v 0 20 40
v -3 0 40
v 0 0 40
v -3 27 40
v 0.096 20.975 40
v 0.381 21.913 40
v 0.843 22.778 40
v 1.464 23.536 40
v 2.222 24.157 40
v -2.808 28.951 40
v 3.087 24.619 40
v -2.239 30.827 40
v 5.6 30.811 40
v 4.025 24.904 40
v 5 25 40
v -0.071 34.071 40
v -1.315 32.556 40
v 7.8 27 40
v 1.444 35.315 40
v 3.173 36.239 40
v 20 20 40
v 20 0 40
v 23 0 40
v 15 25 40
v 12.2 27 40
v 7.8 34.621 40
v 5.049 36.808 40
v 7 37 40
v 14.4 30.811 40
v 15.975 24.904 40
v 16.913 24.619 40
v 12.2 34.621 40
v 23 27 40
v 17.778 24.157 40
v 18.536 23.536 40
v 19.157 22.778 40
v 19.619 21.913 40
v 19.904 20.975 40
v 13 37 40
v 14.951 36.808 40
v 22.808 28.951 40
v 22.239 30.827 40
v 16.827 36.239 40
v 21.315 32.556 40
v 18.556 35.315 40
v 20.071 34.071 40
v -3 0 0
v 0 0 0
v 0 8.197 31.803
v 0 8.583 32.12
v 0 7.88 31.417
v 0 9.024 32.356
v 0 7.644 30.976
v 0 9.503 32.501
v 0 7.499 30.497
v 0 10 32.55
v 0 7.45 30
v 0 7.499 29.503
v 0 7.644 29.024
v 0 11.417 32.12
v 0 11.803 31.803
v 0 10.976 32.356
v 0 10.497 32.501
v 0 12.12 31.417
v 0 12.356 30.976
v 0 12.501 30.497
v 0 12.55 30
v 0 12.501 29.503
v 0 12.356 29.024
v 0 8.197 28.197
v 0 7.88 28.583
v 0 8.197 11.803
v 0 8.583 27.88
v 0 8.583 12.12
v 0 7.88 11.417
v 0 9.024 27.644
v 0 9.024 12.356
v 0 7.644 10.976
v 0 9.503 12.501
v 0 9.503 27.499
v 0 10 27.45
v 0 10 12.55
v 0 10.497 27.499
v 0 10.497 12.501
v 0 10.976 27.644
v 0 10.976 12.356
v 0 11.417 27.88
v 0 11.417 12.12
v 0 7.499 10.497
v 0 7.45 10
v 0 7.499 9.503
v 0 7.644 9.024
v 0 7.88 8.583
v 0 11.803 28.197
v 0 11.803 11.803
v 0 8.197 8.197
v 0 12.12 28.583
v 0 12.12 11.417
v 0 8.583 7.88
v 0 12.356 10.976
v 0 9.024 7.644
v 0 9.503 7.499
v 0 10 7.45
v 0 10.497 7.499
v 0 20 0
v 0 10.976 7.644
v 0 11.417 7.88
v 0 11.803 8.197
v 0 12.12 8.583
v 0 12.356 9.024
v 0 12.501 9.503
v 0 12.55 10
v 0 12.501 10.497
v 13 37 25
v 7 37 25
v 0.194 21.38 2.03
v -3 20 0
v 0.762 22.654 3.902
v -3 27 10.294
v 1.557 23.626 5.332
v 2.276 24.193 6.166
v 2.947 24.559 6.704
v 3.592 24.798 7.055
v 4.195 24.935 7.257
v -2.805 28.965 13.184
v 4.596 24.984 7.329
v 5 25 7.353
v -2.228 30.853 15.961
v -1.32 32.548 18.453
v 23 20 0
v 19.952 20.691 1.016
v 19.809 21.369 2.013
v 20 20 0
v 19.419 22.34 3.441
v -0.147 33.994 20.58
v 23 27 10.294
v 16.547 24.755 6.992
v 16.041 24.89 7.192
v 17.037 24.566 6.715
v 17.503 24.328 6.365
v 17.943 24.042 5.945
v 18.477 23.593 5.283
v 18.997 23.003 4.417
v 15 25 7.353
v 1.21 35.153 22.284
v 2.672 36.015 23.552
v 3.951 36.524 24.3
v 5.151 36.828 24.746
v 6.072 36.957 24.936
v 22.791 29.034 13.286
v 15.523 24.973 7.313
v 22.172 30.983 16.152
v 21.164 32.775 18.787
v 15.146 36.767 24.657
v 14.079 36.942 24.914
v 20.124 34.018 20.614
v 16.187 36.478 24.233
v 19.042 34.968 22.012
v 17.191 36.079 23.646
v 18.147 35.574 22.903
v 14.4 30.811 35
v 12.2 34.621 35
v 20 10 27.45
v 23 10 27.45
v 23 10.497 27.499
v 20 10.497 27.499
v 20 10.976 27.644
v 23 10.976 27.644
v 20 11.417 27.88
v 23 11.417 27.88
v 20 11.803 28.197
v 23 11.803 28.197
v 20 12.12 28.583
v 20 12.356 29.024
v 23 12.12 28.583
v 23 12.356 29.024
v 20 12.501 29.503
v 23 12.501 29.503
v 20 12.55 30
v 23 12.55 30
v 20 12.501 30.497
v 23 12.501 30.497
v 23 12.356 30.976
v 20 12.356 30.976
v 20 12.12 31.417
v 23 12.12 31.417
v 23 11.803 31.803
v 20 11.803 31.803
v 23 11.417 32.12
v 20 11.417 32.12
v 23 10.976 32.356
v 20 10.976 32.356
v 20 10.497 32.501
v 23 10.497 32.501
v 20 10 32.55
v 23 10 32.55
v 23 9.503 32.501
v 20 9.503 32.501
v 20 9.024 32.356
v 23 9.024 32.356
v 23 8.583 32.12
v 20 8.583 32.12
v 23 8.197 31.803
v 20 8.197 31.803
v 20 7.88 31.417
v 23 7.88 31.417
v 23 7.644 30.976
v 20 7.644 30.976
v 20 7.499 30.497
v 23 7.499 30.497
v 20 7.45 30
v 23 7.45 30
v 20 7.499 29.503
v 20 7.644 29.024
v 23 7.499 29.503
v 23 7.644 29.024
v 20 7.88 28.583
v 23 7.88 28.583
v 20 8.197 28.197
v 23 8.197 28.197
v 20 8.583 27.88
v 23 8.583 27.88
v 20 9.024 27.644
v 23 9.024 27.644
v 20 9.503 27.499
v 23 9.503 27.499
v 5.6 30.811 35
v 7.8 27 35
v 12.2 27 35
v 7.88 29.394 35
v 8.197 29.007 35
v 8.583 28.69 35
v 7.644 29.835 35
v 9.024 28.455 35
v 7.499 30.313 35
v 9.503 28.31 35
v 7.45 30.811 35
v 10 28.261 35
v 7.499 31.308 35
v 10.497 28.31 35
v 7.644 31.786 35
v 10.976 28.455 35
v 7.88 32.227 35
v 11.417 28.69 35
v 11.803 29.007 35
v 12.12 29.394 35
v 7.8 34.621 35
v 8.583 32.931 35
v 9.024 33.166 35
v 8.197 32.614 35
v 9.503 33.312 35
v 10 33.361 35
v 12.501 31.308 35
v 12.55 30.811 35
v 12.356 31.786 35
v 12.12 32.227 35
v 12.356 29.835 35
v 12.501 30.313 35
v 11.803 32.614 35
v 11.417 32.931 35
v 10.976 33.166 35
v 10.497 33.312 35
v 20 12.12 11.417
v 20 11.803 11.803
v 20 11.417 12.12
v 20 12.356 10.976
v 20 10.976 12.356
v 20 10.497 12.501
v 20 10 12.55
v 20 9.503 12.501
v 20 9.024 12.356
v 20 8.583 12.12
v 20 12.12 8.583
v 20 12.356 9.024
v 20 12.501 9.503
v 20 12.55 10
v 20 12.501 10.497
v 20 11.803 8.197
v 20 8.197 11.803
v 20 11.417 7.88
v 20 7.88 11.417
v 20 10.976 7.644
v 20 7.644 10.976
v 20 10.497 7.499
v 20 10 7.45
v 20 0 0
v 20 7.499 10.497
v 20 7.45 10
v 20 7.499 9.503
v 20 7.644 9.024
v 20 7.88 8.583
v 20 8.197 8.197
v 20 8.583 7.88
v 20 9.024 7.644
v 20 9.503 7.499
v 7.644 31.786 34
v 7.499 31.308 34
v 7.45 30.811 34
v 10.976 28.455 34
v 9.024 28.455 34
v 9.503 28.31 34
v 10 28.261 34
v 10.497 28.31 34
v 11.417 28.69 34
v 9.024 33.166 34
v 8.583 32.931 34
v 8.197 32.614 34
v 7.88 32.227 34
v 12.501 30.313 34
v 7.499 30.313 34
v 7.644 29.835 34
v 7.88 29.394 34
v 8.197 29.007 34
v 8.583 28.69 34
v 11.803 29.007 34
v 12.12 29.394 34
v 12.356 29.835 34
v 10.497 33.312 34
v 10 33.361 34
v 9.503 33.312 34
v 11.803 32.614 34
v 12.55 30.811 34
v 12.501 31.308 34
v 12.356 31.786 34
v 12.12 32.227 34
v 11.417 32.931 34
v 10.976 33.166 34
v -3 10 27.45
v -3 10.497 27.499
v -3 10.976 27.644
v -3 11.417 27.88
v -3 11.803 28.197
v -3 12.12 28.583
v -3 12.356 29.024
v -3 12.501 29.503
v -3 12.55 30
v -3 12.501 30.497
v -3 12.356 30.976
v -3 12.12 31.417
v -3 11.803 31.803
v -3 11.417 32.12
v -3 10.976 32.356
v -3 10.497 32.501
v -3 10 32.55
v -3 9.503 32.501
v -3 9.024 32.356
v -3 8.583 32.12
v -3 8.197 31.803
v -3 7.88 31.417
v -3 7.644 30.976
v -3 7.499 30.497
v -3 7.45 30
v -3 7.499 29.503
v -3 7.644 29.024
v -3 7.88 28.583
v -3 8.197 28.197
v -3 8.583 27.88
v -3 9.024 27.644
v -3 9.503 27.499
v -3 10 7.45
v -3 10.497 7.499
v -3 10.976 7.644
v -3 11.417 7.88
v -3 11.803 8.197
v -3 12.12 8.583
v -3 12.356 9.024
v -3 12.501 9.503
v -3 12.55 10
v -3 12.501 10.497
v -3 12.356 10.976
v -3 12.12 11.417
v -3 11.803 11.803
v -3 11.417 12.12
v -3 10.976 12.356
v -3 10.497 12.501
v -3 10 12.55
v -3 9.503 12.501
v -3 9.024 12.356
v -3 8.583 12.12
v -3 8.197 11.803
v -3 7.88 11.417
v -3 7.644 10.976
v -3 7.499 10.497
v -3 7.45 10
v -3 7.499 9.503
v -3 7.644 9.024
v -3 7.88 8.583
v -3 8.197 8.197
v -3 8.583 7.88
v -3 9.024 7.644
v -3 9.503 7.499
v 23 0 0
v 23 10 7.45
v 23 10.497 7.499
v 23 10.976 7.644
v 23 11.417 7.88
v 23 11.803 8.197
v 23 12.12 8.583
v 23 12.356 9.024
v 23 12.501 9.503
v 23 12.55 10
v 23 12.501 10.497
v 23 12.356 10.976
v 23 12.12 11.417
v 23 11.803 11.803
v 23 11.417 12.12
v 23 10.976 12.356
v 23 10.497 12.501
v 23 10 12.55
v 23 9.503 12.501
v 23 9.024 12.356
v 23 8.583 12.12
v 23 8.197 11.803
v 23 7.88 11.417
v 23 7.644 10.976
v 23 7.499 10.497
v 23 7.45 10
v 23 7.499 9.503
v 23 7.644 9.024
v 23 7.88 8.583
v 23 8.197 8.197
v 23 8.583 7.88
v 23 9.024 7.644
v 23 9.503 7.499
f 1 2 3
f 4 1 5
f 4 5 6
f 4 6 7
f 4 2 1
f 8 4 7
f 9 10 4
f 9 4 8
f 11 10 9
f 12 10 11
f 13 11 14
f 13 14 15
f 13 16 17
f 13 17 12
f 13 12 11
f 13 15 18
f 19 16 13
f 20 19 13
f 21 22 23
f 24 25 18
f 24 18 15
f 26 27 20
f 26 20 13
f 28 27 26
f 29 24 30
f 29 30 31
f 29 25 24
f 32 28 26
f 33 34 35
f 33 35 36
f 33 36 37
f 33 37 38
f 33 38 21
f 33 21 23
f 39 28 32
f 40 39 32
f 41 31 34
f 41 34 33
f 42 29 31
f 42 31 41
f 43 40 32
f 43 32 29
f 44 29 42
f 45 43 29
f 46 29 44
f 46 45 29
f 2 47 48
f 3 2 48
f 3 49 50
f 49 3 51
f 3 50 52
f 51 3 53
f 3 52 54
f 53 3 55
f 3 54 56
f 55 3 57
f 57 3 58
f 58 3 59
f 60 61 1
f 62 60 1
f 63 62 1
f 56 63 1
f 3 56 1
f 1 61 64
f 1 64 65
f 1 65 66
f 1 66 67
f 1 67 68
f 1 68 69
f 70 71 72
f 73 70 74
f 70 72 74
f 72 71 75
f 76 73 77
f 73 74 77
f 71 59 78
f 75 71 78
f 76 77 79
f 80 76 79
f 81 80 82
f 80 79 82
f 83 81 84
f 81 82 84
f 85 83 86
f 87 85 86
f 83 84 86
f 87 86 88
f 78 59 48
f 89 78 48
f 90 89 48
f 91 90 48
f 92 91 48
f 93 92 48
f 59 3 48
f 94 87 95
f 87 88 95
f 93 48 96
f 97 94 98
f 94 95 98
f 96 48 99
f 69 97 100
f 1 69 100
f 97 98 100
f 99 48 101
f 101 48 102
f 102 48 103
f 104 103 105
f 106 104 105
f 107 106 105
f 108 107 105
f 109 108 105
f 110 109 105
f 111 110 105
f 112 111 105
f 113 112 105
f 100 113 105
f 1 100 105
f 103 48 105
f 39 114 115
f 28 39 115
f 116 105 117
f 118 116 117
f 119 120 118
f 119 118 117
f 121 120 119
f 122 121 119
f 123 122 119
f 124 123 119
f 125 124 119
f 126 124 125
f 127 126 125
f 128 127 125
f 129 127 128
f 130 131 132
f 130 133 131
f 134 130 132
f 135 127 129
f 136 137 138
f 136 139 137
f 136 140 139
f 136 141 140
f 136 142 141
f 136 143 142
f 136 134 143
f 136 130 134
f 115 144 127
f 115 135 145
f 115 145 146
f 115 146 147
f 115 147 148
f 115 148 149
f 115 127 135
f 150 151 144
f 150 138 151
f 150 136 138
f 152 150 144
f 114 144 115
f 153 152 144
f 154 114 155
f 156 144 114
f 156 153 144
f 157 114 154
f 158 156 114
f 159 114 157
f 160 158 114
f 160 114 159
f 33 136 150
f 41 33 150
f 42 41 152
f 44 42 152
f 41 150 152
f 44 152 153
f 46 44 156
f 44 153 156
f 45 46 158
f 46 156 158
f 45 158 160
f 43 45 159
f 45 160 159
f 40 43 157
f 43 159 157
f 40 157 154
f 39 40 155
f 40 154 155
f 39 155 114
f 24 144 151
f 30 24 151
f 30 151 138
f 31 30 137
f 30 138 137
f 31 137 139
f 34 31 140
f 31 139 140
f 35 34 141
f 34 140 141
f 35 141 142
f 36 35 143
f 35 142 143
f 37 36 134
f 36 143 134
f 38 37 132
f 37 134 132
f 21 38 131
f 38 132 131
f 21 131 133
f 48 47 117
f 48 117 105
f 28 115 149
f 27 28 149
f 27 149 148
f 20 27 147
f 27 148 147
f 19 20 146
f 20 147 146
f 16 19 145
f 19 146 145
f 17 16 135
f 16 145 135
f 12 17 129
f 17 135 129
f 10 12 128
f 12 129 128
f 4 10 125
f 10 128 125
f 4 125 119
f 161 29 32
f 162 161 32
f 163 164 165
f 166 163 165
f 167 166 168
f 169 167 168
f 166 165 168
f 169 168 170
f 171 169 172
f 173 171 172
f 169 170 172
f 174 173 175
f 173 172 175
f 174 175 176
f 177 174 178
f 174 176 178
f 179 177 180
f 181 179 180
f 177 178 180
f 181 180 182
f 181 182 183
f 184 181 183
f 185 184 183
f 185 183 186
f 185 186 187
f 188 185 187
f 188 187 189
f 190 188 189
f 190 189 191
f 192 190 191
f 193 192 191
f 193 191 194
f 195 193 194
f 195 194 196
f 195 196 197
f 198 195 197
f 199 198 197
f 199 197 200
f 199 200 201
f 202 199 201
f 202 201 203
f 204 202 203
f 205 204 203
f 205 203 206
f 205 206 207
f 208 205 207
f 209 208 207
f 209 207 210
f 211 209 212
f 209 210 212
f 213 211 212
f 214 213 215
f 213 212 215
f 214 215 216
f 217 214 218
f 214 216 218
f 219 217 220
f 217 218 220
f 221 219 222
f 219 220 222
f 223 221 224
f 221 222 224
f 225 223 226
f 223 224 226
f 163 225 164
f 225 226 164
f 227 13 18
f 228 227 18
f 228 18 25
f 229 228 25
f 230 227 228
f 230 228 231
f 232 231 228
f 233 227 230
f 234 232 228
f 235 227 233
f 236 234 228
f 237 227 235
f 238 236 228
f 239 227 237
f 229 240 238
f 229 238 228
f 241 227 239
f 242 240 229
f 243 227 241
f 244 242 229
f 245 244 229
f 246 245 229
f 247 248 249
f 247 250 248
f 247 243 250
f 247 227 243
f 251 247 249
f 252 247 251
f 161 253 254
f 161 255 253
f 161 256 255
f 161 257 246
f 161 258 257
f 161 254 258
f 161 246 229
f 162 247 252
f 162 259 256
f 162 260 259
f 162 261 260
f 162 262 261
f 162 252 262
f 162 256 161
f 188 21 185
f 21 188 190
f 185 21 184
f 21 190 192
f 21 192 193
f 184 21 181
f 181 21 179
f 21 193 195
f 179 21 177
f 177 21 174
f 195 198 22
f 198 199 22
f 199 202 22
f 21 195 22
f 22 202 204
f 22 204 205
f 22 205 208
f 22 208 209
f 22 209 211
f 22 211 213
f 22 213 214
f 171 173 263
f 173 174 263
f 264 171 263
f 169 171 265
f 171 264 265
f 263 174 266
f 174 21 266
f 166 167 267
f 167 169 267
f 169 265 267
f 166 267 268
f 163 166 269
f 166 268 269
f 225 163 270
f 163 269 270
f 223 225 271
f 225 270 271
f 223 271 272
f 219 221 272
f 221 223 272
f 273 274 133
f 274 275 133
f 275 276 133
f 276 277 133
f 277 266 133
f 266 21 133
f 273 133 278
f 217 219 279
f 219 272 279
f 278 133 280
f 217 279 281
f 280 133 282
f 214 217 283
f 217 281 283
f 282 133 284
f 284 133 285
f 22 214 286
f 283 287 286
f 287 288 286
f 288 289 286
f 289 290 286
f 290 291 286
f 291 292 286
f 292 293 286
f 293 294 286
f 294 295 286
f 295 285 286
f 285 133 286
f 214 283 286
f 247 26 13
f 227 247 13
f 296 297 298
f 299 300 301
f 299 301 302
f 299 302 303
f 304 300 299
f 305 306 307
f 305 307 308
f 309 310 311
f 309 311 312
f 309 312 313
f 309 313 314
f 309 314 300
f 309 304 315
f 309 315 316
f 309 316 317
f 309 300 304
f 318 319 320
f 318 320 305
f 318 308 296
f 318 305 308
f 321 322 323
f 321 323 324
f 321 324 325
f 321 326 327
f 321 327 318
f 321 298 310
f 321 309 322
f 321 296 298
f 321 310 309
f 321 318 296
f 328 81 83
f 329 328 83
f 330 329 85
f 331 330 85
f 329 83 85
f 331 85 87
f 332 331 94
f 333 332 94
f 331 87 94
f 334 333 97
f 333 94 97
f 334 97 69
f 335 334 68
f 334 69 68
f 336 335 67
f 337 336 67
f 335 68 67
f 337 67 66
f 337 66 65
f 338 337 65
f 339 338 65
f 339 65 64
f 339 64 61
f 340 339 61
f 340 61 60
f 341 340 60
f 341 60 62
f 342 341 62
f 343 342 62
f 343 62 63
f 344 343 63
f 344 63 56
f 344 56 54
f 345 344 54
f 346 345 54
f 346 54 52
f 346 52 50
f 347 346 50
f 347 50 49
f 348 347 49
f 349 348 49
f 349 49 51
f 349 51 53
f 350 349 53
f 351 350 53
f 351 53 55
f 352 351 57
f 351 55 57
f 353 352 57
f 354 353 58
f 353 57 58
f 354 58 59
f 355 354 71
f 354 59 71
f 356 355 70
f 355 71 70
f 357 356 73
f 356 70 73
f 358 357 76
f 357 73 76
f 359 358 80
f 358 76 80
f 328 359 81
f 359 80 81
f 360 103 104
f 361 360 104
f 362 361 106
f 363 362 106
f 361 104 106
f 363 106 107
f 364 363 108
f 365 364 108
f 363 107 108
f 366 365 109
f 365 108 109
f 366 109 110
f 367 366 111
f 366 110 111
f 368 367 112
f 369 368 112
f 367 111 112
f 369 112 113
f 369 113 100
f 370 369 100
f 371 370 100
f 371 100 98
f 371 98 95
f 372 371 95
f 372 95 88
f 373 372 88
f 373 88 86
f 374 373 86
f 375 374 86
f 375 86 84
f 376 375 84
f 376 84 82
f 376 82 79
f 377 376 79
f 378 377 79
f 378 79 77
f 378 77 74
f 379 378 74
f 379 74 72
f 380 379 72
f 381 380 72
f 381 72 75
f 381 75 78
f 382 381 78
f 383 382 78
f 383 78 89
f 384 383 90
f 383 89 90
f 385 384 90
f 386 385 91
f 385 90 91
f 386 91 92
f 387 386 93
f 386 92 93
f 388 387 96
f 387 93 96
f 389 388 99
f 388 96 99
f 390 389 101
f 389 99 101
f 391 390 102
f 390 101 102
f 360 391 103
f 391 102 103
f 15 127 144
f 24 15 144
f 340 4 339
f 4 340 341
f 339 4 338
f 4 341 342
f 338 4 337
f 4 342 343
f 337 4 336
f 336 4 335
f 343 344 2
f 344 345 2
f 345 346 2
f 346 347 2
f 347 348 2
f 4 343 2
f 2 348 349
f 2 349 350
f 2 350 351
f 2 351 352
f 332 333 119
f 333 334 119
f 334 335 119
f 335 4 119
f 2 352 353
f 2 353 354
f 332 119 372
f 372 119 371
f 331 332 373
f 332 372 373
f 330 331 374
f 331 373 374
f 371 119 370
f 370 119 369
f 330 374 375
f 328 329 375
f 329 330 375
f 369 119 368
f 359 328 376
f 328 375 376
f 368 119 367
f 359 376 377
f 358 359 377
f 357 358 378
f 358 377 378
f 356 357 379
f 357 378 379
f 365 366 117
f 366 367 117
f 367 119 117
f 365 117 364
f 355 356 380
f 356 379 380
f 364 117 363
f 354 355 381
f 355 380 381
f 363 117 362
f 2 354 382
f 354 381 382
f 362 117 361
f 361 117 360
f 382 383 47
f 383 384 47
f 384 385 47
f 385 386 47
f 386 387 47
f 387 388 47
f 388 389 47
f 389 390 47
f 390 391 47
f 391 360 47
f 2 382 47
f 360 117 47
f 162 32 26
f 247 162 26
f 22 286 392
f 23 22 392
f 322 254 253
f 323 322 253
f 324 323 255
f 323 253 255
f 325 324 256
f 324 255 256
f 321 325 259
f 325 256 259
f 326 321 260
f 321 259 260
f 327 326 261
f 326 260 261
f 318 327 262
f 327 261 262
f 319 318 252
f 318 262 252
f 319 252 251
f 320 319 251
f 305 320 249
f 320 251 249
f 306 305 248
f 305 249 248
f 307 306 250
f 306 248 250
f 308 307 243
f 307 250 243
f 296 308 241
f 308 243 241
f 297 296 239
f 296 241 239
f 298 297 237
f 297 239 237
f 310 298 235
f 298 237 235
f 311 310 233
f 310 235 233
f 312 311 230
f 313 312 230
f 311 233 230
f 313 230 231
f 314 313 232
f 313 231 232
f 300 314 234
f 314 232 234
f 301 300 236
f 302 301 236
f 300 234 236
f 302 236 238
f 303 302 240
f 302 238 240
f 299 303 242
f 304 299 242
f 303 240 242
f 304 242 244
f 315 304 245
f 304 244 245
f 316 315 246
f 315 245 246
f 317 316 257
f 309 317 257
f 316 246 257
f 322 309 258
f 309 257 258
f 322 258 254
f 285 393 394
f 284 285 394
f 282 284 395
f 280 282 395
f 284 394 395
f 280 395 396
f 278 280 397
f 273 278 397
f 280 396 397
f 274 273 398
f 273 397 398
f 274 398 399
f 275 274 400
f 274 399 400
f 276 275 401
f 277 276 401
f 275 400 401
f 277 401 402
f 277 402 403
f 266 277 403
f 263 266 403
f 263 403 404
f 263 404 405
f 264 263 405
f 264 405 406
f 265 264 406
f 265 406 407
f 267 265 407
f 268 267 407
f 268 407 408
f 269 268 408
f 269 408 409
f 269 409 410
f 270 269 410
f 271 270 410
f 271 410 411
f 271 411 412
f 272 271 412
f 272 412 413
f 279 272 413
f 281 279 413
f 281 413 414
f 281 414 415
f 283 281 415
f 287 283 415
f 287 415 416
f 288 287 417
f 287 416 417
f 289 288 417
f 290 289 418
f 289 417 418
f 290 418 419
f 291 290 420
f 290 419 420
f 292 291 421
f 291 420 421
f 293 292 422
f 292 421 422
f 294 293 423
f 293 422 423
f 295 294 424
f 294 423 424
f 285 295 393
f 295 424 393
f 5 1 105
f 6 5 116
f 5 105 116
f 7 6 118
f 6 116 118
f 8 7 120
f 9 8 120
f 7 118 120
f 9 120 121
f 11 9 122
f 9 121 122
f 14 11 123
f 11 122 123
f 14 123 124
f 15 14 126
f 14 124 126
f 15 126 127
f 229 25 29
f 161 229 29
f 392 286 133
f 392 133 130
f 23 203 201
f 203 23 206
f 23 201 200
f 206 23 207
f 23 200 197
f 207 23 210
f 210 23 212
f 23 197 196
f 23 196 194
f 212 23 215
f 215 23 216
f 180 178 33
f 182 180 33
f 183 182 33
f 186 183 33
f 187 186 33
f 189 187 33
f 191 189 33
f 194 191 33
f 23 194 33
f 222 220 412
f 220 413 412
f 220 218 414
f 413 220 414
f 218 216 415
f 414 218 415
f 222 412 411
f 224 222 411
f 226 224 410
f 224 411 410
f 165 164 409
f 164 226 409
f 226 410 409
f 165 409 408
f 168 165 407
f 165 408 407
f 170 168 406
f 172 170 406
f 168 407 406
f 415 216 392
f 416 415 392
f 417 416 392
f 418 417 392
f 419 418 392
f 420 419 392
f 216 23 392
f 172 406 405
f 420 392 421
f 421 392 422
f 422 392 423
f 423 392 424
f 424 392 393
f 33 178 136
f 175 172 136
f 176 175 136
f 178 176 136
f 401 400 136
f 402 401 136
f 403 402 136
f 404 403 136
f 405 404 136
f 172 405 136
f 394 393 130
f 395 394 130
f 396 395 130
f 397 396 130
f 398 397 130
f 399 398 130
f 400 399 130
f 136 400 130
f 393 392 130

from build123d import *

# Parameters (mm, degrees)
EXTRUDE_1_DEPTH     = 40
CUT_EXTRUDE_1_DEPTH = 61.373835392
SKETCH_3_R          = 2.55
CUT_EXTRUDE_2_DEPTH = 61.373835392
CUT_EXTRUDE_3_DEPTH = 5
SKETCH_6_R          = 2.55
CUT_EXTRUDE_4_DEPTH = 1


with BuildPart() as part:
    # Эскиз1 → Бобышка-Вытянуть1 (new body)
    with BuildSketch(Plane.XY):
        with BuildLine():
            Line((0, 0), (0, 20))
            ThreePointArc((0, 20), (1.464466094, 23.535533906), (5, 25))
            Line((5, 25), (15, 25))
            ThreePointArc((15, 25), (18.535533906, 23.535533906), (20, 20))
            Line((20, 20), (20, 0))
            Line((20, 0), (23, 0))
            Line((23, 0), (23, 27))
            ThreePointArc((23, 27), (20.071067812, 34.071067812), (13, 37))
            Line((13, 37), (7, 37))
            ThreePointArc((7, 37), (-0.071067812, 34.071067812), (-3, 27))
            Line((-3, 27), (-3, 0))
            Line((-3, 0), (0, 0))
        make_face()
    extrude(amount=EXTRUDE_1_DEPTH)

    # Эскиз2 → Вырез-Вытянуть1 (cut, through all)
    with BuildSketch(Plane(origin=(23, 0, 0), x_dir=(0, 0, -1), z_dir=(1, 0, 0))):
        Polygon((0, 20), (-25, 37), (0, 37), align=None)
    extrude(amount=-CUT_EXTRUDE_1_DEPTH, mode=Mode.SUBTRACT)

    # Эскиз3 → Вырез-Вытянуть2 (cut, through all)
    with BuildSketch(Plane(origin=(23, 0, 0), x_dir=(0, 0, -1), z_dir=(1, 0, 0))):
        with Locations((-30, 10)):
            Circle(SKETCH_3_R)
        with Locations((-10, 10)):
            Circle(SKETCH_3_R)
    extrude(amount=-CUT_EXTRUDE_2_DEPTH, mode=Mode.SUBTRACT)

    # Эскиз4 → Вырез-Вытянуть3 (cut)
    with BuildSketch(Plane.XY.offset(40)):
        Polygon((5.6, 30.810511777), (7.8, 27), (12.2, 27), (14.4, 30.810511777), (12.2, 34.621023553), (7.8, 34.621023553), align=None)
    extrude(amount=-CUT_EXTRUDE_3_DEPTH, mode=Mode.SUBTRACT)

    # Эскиз6 → Вырез-Вытянуть4 (cut)
    with BuildSketch(Plane.XY.offset(35)):
        with Locations((10, 30.810511777)):
            Circle(SKETCH_6_R)
    extrude(amount=-CUT_EXTRUDE_4_DEPTH, mode=Mode.SUBTRACT)


solid = part.part
